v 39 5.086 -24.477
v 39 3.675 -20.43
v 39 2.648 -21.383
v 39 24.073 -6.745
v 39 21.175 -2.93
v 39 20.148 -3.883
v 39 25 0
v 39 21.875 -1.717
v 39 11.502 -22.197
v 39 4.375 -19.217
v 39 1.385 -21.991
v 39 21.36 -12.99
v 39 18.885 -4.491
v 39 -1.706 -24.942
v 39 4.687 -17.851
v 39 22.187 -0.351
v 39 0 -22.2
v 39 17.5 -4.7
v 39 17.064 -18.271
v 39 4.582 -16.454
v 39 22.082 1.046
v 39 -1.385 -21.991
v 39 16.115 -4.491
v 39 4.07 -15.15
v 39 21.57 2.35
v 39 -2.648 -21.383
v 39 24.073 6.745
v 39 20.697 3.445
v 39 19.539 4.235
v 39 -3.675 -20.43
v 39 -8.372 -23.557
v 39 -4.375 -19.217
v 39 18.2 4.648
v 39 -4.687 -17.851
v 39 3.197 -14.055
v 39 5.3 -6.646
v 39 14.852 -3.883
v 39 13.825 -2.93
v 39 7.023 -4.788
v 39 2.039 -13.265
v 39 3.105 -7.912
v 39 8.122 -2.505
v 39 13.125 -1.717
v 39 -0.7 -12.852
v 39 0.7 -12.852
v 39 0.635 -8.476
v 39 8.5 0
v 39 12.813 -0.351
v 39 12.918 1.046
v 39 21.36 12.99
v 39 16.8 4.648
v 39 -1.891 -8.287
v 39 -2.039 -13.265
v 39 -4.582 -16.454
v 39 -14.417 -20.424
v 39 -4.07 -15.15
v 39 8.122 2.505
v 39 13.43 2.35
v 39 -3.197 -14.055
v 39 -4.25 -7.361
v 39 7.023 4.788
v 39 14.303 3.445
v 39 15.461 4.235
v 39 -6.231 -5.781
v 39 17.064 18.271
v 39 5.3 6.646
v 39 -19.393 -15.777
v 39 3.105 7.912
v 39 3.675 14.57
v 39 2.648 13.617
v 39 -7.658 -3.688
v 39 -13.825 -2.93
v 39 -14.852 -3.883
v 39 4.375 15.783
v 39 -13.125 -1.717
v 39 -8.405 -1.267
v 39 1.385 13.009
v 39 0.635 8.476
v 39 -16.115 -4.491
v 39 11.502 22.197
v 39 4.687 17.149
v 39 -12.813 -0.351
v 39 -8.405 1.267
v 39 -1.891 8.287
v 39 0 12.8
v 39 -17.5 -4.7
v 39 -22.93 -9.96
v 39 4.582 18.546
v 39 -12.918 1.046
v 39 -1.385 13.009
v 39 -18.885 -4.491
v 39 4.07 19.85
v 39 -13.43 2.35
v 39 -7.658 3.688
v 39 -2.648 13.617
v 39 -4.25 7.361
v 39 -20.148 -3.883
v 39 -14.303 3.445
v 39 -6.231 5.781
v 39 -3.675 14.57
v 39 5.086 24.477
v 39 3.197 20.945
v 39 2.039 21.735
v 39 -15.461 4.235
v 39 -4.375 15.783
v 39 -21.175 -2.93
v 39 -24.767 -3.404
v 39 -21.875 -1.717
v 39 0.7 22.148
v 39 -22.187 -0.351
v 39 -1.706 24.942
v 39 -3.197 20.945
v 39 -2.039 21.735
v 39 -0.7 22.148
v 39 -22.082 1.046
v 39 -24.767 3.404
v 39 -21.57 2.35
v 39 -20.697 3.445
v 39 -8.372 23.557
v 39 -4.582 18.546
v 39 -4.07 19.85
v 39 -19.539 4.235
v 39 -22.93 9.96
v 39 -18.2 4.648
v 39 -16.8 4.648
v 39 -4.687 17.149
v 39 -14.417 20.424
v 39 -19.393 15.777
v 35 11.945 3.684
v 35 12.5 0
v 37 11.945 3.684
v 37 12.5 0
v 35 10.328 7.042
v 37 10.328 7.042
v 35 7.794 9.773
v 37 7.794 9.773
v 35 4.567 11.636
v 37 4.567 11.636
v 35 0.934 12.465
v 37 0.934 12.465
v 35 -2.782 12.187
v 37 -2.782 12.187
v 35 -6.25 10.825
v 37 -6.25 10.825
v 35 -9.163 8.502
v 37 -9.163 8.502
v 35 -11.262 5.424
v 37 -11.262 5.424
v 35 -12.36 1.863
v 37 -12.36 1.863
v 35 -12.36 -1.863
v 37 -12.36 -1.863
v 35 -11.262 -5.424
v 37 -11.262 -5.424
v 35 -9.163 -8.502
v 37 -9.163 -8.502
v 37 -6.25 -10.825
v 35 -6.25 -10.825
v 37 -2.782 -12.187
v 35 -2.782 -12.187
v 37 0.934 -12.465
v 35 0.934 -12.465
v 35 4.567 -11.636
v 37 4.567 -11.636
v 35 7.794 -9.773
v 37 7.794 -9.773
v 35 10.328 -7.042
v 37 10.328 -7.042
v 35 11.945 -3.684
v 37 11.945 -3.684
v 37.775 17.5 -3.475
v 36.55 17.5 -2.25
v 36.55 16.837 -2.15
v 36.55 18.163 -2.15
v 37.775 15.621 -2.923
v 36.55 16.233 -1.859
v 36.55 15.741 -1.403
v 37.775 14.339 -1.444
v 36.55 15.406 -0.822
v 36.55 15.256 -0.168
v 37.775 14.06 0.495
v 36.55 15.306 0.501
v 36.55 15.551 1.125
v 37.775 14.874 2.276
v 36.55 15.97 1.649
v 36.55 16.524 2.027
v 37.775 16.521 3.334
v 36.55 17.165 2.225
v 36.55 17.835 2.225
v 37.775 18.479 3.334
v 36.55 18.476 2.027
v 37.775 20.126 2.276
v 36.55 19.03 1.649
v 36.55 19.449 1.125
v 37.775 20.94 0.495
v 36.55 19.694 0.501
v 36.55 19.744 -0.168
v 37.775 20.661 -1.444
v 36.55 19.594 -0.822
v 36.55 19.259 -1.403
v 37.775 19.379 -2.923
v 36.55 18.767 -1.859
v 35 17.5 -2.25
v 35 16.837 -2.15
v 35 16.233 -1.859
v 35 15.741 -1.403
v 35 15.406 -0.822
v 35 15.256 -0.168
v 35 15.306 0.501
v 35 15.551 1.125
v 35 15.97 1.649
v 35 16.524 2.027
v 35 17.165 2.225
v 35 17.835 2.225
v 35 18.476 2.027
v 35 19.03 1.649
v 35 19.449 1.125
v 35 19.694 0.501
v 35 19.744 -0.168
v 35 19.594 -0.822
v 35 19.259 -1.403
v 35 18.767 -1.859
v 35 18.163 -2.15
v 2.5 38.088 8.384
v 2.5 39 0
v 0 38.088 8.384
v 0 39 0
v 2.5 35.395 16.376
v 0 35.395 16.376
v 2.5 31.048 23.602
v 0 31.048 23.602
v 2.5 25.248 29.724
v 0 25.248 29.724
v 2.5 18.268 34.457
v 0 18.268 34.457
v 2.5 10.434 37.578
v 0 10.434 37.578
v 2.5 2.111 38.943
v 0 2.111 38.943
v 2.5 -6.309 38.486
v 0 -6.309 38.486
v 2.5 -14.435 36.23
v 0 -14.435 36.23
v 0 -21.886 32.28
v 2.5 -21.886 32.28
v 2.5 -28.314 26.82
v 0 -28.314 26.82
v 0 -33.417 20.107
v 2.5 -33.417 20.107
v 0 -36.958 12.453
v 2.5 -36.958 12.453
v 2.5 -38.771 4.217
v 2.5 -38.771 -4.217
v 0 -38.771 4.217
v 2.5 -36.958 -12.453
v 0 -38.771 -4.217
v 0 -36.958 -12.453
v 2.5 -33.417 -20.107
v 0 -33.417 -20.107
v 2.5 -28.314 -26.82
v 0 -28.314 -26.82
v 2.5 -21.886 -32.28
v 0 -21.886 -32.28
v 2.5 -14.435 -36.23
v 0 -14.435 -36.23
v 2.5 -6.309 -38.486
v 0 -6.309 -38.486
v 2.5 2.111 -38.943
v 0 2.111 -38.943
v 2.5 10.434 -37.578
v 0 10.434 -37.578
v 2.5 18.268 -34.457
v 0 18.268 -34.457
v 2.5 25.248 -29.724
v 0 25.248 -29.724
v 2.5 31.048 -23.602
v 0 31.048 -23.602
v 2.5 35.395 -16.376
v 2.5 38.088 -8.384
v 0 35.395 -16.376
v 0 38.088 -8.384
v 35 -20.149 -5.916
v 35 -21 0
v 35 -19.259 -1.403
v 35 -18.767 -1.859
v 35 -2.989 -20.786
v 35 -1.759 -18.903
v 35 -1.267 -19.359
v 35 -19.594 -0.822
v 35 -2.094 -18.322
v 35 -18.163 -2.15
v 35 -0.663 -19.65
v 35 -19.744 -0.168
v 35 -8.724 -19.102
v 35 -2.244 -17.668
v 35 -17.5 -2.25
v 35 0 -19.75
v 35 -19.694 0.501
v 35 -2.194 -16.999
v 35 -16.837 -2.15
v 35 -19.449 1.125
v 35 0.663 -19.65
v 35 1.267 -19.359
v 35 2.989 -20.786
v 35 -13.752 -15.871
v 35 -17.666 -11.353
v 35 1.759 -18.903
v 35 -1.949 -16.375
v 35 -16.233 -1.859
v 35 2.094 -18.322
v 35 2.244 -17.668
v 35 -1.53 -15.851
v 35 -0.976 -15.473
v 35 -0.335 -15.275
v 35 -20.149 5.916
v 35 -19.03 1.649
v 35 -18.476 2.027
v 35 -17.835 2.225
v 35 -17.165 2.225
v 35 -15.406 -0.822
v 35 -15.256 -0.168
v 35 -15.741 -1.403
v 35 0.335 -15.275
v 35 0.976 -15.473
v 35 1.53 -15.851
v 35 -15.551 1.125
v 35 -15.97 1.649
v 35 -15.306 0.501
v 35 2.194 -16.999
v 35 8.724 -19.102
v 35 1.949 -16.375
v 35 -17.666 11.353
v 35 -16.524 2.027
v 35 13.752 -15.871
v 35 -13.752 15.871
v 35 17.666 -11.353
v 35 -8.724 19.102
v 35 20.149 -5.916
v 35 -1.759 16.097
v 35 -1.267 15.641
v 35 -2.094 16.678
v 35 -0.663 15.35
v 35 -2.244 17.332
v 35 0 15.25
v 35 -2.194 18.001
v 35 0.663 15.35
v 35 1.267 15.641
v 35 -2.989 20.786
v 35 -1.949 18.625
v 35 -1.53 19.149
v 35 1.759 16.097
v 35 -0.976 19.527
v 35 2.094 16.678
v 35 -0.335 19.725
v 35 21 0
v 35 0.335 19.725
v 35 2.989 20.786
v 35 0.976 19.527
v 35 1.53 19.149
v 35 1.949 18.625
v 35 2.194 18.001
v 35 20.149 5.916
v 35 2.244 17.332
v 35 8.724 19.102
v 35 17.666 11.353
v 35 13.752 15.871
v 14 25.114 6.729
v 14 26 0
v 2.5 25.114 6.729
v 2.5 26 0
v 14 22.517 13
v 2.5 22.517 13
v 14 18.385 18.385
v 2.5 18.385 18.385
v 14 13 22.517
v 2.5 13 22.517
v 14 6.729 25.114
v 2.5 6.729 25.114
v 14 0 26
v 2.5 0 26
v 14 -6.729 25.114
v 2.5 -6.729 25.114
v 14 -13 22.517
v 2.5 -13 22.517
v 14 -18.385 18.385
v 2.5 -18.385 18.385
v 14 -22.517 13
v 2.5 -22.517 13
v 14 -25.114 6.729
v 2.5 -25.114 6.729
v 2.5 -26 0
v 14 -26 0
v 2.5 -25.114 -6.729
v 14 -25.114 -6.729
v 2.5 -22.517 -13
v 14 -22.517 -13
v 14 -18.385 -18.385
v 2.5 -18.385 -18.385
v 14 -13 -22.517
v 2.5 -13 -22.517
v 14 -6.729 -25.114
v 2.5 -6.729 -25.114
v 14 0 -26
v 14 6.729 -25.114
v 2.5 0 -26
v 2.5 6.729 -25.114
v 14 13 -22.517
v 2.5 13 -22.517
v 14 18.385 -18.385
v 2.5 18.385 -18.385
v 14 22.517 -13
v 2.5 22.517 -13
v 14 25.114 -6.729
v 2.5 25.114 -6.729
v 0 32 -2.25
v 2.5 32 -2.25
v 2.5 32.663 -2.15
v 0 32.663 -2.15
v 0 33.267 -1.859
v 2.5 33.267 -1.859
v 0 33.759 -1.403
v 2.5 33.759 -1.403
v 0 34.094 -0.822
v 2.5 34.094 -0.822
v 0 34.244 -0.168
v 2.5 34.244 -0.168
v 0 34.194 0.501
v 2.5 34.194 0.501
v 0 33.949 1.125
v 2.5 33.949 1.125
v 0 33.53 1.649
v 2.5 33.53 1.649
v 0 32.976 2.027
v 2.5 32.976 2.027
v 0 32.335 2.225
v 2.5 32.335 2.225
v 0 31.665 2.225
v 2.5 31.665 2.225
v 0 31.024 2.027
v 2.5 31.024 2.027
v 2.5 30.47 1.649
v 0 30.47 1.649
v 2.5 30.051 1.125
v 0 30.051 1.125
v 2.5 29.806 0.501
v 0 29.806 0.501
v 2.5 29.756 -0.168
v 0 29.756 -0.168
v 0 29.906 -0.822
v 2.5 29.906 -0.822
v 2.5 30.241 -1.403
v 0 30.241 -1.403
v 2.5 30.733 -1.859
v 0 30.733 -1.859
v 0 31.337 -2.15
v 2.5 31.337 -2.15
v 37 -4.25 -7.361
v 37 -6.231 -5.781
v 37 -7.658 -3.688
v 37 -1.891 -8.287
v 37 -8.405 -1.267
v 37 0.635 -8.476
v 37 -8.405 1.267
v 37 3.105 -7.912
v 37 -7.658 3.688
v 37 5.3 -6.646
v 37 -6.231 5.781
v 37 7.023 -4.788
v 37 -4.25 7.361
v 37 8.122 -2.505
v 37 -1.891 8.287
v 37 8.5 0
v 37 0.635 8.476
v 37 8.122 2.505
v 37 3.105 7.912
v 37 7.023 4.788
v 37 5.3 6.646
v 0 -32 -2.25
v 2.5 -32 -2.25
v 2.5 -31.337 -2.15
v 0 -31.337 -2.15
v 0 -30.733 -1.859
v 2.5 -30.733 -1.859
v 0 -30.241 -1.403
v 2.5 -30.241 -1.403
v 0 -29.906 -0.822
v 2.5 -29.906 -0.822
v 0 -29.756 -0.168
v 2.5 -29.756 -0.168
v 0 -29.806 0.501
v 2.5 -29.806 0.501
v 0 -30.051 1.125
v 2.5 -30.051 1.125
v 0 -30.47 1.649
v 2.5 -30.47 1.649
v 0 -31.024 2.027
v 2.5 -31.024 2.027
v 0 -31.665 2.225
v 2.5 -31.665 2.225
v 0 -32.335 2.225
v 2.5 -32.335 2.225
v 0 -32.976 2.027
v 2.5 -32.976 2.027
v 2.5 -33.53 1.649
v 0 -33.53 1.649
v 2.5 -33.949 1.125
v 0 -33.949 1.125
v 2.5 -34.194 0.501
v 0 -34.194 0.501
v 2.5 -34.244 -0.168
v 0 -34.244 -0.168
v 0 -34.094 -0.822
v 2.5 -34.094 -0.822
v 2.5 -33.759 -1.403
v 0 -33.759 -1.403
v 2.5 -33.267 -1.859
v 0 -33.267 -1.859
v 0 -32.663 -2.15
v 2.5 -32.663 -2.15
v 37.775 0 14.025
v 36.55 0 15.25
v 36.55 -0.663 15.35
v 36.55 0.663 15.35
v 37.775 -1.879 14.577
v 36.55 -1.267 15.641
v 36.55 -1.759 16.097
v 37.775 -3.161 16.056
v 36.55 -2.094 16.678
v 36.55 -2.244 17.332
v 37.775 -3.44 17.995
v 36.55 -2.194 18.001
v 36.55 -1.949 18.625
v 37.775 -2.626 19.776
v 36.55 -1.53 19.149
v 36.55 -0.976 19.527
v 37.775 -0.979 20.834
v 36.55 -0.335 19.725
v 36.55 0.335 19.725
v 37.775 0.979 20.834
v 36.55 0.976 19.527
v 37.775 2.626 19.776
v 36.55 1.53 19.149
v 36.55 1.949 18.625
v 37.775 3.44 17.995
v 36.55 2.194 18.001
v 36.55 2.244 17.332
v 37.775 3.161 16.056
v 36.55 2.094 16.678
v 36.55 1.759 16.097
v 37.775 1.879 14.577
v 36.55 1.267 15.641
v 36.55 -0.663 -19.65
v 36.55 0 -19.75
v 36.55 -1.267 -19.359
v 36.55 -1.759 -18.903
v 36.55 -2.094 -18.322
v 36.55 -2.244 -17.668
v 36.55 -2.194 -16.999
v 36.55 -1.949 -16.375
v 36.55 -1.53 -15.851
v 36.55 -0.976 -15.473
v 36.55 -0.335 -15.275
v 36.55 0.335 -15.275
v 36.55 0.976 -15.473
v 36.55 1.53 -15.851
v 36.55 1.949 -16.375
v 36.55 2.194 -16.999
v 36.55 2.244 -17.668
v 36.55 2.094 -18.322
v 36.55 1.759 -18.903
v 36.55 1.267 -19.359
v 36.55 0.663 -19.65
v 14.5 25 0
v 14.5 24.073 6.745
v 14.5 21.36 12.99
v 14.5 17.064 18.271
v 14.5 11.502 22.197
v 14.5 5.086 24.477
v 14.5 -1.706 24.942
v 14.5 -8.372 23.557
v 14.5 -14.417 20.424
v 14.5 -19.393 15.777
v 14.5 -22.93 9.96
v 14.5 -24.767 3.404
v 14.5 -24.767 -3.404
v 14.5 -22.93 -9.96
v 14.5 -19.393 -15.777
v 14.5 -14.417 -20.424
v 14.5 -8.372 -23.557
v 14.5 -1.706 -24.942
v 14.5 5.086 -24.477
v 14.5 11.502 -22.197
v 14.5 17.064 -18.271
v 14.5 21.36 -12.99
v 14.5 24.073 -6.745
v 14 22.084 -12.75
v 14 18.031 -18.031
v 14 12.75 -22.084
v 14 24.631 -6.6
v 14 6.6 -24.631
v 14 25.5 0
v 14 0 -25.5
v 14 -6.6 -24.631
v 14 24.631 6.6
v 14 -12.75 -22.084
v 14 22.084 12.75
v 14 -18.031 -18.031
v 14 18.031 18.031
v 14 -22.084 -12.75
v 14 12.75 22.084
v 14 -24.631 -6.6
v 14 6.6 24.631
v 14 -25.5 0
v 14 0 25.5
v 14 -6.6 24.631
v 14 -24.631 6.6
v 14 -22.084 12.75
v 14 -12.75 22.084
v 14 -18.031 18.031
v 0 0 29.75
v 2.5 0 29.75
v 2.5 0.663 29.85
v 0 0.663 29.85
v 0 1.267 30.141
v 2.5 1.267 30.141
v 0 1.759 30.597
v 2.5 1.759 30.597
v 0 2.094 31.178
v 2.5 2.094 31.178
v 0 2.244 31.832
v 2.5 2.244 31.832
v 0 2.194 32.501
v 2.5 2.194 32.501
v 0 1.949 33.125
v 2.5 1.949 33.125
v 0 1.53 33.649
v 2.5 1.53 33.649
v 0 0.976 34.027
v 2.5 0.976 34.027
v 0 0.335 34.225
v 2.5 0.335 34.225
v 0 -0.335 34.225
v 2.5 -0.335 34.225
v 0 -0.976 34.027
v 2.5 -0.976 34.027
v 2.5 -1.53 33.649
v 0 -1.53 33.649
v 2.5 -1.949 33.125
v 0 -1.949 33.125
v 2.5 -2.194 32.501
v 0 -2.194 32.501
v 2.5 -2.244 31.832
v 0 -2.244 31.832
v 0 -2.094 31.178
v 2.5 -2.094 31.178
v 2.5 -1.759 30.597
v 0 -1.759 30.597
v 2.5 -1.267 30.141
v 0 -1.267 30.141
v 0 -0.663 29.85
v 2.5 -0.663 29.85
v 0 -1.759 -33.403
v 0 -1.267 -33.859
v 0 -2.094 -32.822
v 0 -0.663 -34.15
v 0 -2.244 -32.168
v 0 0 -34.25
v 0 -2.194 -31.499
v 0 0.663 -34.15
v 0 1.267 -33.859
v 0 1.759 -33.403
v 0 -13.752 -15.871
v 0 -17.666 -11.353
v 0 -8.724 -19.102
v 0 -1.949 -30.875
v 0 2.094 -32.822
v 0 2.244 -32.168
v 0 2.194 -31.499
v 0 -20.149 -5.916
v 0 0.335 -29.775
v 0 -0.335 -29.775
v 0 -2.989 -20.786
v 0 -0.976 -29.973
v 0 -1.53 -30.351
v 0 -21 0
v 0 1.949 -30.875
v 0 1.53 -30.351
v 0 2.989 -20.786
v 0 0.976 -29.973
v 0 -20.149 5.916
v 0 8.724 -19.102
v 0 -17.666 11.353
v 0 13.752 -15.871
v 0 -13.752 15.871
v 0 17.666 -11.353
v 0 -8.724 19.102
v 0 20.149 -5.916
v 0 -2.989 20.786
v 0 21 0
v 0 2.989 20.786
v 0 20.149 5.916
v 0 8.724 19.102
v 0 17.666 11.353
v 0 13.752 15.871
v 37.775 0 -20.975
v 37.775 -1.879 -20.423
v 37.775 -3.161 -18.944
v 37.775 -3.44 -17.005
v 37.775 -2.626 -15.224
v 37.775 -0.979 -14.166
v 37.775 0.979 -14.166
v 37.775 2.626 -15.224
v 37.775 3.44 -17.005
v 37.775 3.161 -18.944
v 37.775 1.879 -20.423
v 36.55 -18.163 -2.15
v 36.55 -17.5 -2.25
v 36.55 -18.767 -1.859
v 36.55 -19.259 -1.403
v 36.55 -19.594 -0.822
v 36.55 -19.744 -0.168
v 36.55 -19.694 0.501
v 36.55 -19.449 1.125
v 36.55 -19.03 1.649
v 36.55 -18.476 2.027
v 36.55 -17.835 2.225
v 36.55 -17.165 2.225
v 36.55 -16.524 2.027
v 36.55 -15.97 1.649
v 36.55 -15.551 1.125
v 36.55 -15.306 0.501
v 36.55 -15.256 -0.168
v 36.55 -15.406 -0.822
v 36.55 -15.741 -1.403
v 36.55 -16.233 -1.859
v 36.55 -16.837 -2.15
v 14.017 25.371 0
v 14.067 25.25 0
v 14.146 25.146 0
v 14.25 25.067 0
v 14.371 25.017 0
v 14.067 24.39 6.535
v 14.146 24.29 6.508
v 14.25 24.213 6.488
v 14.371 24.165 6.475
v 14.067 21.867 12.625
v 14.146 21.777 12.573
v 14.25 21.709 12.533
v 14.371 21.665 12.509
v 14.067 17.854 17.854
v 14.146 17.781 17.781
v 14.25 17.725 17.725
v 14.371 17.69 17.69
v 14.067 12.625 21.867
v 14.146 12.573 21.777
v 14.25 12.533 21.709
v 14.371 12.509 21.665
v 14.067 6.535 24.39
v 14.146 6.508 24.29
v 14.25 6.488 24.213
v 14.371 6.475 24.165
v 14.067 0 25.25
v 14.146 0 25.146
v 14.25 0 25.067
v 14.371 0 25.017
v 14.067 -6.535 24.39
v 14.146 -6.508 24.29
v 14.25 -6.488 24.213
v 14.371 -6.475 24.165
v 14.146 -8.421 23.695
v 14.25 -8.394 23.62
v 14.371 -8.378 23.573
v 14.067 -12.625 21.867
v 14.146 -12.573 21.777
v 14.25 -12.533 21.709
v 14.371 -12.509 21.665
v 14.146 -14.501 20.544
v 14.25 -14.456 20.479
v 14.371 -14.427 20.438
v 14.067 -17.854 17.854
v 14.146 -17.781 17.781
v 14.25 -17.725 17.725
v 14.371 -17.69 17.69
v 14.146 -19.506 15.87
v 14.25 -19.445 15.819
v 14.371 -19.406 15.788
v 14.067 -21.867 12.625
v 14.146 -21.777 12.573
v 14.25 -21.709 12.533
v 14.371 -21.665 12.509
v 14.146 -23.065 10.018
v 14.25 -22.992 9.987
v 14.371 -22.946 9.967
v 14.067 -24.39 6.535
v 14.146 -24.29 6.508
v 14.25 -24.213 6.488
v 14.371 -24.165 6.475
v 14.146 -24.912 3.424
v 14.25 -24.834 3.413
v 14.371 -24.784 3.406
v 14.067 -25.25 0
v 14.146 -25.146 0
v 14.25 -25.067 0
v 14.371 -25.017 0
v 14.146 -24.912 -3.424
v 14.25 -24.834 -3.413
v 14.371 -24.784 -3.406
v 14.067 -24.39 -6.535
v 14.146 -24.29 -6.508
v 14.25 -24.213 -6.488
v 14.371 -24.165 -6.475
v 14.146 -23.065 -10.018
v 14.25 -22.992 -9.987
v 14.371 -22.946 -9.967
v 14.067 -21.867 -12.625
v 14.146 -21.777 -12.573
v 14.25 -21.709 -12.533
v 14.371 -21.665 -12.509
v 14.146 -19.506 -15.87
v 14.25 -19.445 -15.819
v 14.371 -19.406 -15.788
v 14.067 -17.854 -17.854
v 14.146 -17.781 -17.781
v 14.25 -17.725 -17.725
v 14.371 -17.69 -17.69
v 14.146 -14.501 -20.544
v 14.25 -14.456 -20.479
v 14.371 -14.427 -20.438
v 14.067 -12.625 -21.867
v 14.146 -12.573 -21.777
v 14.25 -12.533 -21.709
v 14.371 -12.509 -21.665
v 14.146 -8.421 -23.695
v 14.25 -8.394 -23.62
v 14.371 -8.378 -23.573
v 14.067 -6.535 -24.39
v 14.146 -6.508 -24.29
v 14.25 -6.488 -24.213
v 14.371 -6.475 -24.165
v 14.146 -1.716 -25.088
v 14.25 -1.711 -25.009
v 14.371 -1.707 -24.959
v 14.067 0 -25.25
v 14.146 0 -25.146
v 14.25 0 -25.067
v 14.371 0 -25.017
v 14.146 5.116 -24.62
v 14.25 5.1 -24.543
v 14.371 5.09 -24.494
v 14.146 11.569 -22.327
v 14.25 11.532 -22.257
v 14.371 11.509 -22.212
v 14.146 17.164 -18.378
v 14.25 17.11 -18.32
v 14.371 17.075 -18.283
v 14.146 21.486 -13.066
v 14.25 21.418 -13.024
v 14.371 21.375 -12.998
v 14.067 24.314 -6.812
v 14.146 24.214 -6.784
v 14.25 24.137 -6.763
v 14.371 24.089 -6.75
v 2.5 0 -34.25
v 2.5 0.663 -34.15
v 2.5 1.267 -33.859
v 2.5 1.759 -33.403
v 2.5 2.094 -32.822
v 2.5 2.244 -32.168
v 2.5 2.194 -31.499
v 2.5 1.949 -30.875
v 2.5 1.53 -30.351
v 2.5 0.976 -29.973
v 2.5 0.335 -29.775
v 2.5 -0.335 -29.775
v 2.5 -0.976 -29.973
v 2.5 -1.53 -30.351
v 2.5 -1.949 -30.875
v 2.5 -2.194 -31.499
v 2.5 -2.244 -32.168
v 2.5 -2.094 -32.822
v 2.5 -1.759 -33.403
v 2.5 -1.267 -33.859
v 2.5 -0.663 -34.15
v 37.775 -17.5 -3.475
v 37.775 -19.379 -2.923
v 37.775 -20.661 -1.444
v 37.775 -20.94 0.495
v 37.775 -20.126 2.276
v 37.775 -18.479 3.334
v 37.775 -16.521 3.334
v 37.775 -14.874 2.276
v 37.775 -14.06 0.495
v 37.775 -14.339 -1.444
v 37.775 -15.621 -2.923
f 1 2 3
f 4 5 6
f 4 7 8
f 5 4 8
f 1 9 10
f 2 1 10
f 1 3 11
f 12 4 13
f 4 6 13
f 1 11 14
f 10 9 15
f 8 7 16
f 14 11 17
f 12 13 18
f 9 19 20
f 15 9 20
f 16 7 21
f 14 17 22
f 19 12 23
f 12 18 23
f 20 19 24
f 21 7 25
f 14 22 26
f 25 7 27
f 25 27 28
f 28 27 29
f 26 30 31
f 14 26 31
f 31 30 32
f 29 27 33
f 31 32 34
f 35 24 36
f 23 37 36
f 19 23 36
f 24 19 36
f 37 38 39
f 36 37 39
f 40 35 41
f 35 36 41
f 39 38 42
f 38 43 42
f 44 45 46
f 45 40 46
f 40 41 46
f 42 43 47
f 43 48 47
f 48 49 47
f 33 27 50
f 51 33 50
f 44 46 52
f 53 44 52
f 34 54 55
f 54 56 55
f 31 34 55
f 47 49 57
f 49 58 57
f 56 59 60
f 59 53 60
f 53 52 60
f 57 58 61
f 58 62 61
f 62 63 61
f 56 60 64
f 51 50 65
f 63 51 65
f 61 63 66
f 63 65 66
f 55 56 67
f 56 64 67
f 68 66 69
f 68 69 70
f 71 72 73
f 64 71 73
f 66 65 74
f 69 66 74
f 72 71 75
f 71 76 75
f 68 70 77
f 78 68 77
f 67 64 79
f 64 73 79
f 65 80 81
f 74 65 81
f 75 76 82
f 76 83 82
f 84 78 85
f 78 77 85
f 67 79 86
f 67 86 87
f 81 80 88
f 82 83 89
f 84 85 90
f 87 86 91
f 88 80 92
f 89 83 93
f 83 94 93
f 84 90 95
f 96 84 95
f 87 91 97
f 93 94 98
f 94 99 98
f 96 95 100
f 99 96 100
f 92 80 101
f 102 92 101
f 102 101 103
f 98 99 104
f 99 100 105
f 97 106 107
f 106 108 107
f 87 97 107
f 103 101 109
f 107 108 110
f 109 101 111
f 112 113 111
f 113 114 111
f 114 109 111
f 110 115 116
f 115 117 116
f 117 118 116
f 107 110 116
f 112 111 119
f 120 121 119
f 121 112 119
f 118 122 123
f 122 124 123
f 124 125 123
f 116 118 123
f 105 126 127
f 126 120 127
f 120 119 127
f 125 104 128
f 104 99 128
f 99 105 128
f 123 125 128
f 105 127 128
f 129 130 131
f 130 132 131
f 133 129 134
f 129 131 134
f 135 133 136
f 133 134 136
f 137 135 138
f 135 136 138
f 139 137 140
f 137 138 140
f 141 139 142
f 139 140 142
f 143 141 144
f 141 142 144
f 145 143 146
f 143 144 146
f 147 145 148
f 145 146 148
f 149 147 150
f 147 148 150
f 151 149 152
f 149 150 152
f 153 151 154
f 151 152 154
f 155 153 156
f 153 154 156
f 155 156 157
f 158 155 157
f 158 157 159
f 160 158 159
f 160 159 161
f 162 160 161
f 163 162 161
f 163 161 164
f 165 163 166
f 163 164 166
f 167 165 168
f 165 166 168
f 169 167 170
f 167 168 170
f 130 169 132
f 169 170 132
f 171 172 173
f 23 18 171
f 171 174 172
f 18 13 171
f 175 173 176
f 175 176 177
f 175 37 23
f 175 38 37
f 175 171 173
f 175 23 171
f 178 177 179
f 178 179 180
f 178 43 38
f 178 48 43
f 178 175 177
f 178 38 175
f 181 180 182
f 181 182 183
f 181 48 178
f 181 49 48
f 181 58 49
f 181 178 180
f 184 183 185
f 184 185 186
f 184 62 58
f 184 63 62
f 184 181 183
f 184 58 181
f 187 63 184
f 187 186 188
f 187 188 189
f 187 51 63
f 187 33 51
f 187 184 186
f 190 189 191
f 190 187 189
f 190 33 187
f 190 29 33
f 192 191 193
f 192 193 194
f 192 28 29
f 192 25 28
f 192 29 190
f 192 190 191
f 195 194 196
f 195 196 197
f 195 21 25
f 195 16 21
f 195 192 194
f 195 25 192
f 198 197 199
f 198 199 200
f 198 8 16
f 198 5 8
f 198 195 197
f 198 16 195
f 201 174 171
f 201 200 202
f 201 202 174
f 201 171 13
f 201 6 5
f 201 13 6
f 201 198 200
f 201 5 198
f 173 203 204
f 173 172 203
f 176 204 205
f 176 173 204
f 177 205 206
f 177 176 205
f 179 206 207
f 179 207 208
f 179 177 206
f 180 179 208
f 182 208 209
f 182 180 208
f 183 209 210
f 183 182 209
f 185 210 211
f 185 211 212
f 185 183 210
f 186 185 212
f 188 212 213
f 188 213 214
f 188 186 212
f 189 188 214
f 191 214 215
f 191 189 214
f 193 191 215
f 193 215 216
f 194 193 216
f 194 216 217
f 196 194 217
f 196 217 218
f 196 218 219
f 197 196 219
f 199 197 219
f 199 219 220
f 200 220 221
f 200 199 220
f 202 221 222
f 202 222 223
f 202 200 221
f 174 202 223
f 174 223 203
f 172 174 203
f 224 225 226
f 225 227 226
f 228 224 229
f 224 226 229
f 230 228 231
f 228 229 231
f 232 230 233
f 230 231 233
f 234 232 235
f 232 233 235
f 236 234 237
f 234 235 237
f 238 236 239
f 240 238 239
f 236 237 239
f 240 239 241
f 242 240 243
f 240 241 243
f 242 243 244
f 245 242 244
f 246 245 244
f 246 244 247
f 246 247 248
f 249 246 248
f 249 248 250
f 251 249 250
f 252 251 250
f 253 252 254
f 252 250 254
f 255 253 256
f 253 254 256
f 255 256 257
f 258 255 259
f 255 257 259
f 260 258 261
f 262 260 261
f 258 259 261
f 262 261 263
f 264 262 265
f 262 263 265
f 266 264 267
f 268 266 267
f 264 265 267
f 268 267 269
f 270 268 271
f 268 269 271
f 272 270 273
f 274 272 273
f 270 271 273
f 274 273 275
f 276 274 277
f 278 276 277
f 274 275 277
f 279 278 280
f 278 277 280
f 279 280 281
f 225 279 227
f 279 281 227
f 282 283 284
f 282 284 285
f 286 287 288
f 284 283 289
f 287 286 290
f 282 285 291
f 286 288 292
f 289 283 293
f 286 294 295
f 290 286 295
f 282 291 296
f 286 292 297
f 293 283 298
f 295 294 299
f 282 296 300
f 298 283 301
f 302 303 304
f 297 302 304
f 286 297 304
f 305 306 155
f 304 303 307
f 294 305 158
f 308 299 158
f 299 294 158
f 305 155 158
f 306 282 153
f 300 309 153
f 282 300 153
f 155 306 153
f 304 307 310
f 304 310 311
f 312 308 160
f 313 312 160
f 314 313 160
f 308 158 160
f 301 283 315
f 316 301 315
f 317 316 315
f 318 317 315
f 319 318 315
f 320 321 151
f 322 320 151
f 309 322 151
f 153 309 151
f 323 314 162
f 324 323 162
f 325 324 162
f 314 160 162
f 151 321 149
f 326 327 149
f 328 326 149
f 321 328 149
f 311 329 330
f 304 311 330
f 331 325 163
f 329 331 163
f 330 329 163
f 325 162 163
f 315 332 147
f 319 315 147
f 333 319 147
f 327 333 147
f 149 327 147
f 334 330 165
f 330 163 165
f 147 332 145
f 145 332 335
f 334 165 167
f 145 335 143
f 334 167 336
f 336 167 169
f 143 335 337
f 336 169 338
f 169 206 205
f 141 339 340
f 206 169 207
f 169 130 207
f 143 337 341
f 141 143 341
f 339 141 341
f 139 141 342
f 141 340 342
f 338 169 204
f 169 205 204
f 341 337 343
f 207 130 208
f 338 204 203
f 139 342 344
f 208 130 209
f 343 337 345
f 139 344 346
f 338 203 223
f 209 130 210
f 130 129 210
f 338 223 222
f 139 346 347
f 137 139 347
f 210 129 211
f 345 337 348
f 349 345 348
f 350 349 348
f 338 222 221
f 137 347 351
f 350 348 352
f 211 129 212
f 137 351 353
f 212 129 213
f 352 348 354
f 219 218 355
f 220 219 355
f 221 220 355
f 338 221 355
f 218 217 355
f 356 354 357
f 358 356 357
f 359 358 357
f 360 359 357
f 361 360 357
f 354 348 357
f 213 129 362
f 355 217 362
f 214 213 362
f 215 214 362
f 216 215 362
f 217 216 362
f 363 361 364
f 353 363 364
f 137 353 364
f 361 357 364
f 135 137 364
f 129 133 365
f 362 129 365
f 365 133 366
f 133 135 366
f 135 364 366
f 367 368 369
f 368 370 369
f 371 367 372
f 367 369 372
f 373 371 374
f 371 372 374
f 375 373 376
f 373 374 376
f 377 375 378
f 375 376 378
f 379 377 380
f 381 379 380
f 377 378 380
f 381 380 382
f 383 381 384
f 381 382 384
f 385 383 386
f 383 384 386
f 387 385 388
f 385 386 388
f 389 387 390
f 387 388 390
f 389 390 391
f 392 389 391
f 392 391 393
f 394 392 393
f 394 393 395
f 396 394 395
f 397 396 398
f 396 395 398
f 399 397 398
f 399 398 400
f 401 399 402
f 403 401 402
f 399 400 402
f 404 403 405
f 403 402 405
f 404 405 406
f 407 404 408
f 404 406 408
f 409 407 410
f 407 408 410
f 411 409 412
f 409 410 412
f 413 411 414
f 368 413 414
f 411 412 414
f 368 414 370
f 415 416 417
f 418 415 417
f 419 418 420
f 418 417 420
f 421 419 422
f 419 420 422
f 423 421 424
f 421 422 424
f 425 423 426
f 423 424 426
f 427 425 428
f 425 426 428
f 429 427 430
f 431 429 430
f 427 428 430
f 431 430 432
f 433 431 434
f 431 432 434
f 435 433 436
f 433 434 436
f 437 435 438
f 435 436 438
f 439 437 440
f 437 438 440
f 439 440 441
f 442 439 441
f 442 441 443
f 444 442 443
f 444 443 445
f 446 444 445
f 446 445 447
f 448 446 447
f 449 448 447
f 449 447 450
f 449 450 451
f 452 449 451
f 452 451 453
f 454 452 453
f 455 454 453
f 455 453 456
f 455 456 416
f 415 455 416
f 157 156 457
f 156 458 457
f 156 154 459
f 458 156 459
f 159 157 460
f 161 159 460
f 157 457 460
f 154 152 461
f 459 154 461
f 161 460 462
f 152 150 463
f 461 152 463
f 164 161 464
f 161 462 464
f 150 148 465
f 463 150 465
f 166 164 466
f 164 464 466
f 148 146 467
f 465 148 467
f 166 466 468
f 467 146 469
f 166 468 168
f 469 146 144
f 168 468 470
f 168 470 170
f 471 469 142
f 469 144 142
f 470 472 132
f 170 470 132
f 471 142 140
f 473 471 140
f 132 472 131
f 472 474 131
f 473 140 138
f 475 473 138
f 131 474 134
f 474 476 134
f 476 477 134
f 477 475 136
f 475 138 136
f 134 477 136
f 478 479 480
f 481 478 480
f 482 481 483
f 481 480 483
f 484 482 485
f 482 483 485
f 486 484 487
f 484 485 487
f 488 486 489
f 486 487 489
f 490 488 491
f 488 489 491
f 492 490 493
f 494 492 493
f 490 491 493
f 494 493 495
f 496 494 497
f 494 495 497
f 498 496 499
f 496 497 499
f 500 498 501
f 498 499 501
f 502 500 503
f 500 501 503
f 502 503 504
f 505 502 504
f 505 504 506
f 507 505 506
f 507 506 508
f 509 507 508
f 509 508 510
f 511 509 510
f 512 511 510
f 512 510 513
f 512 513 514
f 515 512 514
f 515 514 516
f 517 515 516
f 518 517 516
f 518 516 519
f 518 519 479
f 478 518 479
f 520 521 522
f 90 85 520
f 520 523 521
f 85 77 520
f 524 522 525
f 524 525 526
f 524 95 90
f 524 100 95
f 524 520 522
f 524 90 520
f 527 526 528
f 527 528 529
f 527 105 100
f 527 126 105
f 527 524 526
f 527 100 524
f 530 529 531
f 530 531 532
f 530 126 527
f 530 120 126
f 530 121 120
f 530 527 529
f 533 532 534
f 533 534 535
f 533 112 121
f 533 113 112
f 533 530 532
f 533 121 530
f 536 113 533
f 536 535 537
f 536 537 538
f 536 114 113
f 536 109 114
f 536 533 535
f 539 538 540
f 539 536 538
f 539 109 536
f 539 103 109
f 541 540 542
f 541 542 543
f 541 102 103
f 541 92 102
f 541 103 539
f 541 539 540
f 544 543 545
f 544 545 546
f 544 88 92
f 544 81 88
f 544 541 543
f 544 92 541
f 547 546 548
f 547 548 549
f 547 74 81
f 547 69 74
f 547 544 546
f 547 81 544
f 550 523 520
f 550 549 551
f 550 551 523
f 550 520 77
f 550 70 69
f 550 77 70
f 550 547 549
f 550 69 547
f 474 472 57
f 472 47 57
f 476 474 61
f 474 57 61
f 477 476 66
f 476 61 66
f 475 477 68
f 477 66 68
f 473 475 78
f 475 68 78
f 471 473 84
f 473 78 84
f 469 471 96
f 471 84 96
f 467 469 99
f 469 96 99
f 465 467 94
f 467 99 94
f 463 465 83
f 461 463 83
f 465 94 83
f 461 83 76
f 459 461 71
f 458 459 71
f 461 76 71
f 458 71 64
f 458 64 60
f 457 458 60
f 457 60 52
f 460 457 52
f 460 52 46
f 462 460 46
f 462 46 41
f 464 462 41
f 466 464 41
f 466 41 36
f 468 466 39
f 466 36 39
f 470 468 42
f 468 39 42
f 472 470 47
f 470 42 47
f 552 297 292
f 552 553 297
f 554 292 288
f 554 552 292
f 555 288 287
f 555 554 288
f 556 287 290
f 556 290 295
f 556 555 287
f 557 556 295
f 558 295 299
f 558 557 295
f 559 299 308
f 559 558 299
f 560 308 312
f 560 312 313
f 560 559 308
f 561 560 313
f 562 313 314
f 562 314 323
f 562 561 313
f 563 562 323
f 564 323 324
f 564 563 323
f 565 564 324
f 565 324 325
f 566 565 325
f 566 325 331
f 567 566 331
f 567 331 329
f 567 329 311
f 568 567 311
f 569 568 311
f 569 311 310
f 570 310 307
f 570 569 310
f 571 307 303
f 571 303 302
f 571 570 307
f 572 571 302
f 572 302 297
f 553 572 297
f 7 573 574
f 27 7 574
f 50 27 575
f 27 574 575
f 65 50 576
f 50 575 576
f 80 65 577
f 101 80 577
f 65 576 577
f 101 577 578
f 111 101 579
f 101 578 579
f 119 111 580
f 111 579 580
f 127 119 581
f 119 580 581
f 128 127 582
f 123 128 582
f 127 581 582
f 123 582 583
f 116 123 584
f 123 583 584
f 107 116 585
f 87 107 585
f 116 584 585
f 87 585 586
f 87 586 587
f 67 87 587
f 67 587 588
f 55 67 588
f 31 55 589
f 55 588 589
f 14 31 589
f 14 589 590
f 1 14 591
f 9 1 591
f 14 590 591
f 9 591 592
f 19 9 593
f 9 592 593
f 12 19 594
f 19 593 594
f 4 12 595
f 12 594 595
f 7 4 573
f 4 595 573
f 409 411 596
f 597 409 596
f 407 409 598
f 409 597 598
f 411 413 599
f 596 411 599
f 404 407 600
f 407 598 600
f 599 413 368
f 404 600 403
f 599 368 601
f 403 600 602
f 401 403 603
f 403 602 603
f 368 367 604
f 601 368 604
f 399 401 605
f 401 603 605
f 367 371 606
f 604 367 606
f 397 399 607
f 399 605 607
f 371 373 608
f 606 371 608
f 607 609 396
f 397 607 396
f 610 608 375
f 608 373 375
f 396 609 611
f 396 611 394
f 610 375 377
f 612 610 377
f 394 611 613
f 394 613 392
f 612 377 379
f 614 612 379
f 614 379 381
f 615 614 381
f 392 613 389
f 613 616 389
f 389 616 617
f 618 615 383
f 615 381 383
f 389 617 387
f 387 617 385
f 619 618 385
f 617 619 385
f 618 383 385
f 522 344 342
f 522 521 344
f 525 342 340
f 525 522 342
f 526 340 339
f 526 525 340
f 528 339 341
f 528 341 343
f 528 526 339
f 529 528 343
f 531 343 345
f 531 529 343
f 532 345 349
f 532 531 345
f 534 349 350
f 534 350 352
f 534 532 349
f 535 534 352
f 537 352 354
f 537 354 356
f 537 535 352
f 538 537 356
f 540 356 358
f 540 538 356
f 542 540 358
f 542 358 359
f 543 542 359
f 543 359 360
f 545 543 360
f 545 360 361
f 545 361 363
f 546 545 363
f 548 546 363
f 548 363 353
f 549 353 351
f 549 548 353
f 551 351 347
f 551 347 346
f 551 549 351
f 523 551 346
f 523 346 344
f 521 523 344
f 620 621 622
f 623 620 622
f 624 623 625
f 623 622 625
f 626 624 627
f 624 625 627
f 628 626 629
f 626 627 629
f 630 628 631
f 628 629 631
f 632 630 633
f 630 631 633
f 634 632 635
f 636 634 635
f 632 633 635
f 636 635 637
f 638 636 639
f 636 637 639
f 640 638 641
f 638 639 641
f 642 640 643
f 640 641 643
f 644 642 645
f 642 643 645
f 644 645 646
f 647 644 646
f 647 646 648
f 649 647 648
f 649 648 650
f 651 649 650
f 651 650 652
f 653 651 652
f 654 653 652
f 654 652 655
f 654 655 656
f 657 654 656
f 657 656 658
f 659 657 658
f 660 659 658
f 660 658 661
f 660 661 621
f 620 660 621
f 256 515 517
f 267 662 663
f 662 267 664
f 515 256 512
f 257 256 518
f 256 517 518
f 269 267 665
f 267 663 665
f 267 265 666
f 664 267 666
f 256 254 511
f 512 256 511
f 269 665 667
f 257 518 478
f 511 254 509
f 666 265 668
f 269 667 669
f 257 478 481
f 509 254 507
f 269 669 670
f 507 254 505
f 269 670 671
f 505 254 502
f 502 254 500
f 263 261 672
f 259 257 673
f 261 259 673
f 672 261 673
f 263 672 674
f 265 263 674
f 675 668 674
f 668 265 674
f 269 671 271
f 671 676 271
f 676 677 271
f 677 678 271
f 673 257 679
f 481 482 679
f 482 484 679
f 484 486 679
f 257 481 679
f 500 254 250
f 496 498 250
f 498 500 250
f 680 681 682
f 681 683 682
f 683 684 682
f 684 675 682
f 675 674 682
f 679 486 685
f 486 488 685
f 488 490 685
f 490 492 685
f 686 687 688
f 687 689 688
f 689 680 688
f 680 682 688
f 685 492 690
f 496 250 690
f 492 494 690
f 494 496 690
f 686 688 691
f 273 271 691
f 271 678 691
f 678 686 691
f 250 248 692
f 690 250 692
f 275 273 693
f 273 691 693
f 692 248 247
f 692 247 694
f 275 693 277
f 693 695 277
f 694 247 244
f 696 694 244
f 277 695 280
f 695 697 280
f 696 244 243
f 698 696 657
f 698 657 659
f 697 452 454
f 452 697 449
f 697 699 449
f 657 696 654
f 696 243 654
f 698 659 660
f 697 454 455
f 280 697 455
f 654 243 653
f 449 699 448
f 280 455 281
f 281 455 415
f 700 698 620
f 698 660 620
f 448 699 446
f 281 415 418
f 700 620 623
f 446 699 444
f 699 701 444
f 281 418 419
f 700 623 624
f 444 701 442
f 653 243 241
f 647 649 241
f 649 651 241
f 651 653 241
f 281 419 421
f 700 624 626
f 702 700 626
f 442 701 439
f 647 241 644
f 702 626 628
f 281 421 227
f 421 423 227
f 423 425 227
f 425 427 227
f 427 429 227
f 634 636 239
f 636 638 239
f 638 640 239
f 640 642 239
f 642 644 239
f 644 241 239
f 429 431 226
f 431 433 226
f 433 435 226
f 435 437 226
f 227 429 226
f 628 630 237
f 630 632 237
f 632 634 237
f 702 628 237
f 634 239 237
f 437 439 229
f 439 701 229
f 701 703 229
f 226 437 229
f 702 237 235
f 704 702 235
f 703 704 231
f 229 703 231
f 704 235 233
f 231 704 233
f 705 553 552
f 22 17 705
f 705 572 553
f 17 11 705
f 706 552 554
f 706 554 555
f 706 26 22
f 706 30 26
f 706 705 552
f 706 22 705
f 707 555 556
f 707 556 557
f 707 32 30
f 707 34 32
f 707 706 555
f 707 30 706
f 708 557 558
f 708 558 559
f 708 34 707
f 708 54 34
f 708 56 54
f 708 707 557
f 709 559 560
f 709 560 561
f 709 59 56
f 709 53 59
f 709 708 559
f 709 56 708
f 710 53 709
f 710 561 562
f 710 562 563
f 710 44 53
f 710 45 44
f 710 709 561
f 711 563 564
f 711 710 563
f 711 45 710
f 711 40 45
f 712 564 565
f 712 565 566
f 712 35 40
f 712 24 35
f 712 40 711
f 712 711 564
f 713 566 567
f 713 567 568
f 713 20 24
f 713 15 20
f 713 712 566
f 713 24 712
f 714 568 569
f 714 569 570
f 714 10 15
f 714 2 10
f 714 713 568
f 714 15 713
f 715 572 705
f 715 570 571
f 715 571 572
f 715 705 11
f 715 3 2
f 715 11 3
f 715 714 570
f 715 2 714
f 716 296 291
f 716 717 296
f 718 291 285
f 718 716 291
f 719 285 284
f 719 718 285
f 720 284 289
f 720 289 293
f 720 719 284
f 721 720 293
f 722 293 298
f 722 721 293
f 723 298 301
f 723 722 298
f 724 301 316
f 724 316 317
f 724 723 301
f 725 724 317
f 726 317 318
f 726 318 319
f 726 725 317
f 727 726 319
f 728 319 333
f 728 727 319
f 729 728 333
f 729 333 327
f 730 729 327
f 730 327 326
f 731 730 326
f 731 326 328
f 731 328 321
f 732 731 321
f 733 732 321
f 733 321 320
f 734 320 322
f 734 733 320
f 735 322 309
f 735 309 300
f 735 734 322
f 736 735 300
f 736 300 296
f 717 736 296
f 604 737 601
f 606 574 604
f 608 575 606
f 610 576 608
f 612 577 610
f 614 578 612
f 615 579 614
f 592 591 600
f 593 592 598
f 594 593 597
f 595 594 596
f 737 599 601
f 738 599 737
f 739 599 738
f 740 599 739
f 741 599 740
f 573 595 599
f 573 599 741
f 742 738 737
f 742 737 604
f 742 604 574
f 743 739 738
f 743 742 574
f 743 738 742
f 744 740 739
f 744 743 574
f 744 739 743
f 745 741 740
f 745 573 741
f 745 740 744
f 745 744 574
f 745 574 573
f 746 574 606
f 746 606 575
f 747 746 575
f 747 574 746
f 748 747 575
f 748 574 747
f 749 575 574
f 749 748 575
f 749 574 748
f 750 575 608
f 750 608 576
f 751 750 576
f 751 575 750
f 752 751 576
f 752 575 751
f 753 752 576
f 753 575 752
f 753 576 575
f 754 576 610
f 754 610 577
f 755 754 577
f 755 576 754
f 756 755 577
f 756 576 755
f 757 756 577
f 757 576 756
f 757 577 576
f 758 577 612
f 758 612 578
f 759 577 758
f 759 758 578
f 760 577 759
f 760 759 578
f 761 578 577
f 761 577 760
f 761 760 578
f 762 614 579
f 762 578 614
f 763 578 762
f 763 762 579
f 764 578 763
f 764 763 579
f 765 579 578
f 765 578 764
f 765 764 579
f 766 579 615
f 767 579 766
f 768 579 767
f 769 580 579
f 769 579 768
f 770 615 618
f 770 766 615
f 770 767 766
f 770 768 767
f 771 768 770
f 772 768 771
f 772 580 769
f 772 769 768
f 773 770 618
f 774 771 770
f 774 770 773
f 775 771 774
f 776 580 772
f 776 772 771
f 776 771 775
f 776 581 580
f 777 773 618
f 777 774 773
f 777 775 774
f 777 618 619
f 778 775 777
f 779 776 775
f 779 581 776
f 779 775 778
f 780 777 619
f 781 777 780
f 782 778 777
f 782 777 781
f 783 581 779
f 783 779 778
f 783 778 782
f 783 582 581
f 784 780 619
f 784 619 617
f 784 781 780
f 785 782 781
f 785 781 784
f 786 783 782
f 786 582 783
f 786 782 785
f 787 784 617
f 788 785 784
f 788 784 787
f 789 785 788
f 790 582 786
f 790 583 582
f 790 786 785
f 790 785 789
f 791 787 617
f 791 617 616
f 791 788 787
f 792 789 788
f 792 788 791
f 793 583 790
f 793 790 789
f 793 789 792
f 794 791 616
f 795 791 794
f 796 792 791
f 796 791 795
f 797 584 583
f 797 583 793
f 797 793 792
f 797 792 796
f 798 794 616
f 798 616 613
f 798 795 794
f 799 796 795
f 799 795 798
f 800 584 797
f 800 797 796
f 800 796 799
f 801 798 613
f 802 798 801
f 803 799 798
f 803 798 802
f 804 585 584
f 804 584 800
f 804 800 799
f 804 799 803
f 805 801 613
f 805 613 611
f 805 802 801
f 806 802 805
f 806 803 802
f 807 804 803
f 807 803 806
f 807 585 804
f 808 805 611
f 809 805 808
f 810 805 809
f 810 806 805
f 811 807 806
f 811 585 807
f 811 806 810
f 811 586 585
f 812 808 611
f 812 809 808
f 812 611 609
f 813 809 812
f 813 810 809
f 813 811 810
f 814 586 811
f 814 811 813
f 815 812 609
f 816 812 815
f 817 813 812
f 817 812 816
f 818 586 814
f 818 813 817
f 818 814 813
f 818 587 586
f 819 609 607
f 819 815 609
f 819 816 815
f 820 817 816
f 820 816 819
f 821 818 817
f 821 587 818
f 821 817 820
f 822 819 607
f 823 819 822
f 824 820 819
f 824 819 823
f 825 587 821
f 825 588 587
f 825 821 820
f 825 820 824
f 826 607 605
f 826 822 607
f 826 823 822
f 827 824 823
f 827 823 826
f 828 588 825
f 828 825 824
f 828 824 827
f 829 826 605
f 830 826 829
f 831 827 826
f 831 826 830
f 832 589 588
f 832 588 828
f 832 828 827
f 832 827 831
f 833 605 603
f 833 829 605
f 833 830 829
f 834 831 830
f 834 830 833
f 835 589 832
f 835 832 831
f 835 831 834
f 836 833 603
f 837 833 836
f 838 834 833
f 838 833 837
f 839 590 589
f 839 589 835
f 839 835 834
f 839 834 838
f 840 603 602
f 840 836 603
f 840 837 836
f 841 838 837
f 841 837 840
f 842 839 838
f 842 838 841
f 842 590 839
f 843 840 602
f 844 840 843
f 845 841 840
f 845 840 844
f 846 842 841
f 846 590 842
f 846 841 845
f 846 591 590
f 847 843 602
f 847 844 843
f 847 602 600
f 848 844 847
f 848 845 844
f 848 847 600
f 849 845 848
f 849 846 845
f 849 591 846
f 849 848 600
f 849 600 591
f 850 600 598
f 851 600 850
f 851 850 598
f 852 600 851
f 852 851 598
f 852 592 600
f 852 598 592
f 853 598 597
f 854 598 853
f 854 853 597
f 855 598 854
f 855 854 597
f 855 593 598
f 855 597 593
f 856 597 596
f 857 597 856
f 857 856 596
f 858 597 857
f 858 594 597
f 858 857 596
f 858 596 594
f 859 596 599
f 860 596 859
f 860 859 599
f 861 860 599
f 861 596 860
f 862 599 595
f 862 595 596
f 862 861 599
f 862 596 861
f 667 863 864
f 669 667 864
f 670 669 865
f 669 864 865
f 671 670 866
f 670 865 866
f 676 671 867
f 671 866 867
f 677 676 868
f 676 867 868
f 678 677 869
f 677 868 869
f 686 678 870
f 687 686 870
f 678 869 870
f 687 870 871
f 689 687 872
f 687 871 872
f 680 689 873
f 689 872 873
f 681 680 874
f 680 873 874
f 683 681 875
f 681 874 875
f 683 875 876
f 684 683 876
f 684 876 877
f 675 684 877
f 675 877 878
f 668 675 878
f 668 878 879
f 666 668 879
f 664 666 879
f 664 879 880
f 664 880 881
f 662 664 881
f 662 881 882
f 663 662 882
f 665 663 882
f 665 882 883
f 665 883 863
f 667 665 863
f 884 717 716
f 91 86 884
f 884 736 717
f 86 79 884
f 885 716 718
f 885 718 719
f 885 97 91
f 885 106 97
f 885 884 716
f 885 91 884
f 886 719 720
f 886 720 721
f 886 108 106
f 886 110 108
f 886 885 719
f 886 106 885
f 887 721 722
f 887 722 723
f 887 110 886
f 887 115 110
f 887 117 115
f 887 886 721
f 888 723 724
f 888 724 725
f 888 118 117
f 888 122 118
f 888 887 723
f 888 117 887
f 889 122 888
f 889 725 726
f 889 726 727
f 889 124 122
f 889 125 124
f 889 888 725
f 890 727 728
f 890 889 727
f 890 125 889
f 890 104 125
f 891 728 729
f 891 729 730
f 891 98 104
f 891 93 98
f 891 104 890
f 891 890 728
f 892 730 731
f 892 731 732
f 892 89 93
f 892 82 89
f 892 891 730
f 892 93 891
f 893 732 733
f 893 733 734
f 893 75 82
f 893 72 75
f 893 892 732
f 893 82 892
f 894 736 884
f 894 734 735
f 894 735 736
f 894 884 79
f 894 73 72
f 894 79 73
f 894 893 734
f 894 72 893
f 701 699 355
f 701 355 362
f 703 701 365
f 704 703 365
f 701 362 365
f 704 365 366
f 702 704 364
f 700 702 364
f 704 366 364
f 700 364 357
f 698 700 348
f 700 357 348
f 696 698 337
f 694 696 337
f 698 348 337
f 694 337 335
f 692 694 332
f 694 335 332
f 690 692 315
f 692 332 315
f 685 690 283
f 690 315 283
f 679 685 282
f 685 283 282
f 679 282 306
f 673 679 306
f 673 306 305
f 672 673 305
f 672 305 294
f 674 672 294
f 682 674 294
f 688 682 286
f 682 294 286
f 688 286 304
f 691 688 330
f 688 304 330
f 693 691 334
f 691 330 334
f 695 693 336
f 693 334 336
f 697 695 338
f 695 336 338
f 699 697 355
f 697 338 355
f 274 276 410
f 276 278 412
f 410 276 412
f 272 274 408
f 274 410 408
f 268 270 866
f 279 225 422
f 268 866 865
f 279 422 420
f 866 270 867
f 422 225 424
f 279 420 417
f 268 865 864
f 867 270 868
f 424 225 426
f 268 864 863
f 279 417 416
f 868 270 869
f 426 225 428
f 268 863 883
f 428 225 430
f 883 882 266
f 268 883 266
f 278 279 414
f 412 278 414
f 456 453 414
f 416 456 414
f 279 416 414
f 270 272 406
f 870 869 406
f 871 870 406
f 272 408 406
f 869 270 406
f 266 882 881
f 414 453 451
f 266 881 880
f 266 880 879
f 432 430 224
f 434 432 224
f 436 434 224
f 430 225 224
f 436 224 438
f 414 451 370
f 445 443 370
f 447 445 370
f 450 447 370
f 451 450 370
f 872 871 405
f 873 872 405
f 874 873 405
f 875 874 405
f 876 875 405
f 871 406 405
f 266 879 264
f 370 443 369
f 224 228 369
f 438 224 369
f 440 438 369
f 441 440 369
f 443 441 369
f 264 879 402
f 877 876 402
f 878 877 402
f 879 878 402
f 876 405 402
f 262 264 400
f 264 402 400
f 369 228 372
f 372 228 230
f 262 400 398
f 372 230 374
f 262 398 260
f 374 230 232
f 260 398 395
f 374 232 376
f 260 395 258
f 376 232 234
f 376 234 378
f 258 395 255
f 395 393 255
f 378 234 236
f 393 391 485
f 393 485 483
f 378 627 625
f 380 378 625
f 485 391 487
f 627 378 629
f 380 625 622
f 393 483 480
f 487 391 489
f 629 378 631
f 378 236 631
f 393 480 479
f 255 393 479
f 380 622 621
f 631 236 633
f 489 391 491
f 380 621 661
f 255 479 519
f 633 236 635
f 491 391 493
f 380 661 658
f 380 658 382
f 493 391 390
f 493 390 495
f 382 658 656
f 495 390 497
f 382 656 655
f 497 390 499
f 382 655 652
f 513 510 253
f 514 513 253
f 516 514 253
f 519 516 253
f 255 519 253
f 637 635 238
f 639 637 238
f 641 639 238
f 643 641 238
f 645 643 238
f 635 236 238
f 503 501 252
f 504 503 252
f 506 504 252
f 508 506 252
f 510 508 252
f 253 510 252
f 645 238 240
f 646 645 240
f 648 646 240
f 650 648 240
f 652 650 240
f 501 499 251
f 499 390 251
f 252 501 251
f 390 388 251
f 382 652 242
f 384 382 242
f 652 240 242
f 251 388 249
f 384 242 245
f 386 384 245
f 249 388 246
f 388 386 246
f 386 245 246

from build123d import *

# Parameters (mm, degrees)
CSK_FOR_M4_FLAT_HEAD_MACHINE_SCREW1_AT_2_COUNT = 2
CSK_FOR_M4_FLAT_HEAD_MACHINE_SCREW1_AT_2_PITCH = 24.748737342
CSK_FOR_M4_FLAT_HEAD_MACHINE_SCREW1_AT_3_COUNT = 2
CSK_FOR_M4_FLAT_HEAD_MACHINE_SCREW1_AT_3_PITCH = 35
CSK_FOR_M4_FLAT_HEAD_MACHINE_SCREW1_AT_4_COUNT = 2
CSK_FOR_M4_FLAT_HEAD_MACHINE_SCREW1_AT_4_PITCH = 24.748737342
M4_CLEARANCE_HOLE1_D                           = 4.5
M4_CLEARANCE_HOLE1_DEPTH                       = 2.5
FILLET1_R                                      = 0.5


with BuildPart() as part:
    # Sketch2 → Revolve1 (revolve)
    with BuildSketch(Plane.XY):
        Polygon((0, 21), (35, 21), (35, 12.5), (37, 12.5), (37, 8.5), (39, 8.5), (39, 25), (14, 25), (14, 26), (2.5, 26), (2.5, 39), (0, 39), (0, 26), align=None)
    revolve(axis=Axis((-64.103352454, 0, 0), (1, 0, 0)))

    # Sketch8 → CSK for M4 Flat Head Machine Screw1 (revolve, cut)
    with BuildSketch(Plane(origin=(39, 17.5, 0), x_dir=(0, 0, -1), z_dir=(0, 1, 0))):
        Polygon((0, 0), (0, 4), (2.25, 4), (2.25, 2.45), (4.7, 0), align=None)
    csk_for_m4_flat_head_machine_screw1 = revolve(axis=Axis((45.35, 17.5, 0), (-1, 0, 0)), mode=Mode.SUBTRACT)

    # CSK for M4 Flat Head Machine Screw1 at 2: CSK for M4 Flat Head Machine Screw1 ×2
    with Locations(*[Vector(0, -0.707106781, -0.707106781) * (i * CSK_FOR_M4_FLAT_HEAD_MACHINE_SCREW1_AT_2_PITCH) for i in range(1, CSK_FOR_M4_FLAT_HEAD_MACHINE_SCREW1_AT_2_COUNT)]):
        add(csk_for_m4_flat_head_machine_screw1, mode=Mode.SUBTRACT)

    # CSK for M4 Flat Head Machine Screw1 at 3: CSK for M4 Flat Head Machine Screw1 ×2
    with Locations(*[(0, -i * CSK_FOR_M4_FLAT_HEAD_MACHINE_SCREW1_AT_3_PITCH, 0) for i in range(1, CSK_FOR_M4_FLAT_HEAD_MACHINE_SCREW1_AT_3_COUNT)]):
        add(csk_for_m4_flat_head_machine_screw1, mode=Mode.SUBTRACT)

    # CSK for M4 Flat Head Machine Screw1 at 4: CSK for M4 Flat Head Machine Screw1 ×2
    with Locations(*[Vector(0, -0.707106781, 0.707106781) * (i * CSK_FOR_M4_FLAT_HEAD_MACHINE_SCREW1_AT_4_PITCH) for i in range(1, CSK_FOR_M4_FLAT_HEAD_MACHINE_SCREW1_AT_4_COUNT)]):
        add(csk_for_m4_flat_head_machine_screw1, mode=Mode.SUBTRACT)

    # M4 Clearance Hole1
    with Locations(Plane.ZY):
        with Locations((0, 32), (0, -32), (32, 0), (-32, 0)):
            Hole(M4_CLEARANCE_HOLE1_D / 2, depth=M4_CLEARANCE_HOLE1_DEPTH)

    # Fillet1
    fillet1_edges = [part.edges().sort_by_distance(p)[0] for p in [
        (14, -25, 0),
    ]]
    fillet(fillet1_edges, radius=FILLET1_R)


solid = part.part
